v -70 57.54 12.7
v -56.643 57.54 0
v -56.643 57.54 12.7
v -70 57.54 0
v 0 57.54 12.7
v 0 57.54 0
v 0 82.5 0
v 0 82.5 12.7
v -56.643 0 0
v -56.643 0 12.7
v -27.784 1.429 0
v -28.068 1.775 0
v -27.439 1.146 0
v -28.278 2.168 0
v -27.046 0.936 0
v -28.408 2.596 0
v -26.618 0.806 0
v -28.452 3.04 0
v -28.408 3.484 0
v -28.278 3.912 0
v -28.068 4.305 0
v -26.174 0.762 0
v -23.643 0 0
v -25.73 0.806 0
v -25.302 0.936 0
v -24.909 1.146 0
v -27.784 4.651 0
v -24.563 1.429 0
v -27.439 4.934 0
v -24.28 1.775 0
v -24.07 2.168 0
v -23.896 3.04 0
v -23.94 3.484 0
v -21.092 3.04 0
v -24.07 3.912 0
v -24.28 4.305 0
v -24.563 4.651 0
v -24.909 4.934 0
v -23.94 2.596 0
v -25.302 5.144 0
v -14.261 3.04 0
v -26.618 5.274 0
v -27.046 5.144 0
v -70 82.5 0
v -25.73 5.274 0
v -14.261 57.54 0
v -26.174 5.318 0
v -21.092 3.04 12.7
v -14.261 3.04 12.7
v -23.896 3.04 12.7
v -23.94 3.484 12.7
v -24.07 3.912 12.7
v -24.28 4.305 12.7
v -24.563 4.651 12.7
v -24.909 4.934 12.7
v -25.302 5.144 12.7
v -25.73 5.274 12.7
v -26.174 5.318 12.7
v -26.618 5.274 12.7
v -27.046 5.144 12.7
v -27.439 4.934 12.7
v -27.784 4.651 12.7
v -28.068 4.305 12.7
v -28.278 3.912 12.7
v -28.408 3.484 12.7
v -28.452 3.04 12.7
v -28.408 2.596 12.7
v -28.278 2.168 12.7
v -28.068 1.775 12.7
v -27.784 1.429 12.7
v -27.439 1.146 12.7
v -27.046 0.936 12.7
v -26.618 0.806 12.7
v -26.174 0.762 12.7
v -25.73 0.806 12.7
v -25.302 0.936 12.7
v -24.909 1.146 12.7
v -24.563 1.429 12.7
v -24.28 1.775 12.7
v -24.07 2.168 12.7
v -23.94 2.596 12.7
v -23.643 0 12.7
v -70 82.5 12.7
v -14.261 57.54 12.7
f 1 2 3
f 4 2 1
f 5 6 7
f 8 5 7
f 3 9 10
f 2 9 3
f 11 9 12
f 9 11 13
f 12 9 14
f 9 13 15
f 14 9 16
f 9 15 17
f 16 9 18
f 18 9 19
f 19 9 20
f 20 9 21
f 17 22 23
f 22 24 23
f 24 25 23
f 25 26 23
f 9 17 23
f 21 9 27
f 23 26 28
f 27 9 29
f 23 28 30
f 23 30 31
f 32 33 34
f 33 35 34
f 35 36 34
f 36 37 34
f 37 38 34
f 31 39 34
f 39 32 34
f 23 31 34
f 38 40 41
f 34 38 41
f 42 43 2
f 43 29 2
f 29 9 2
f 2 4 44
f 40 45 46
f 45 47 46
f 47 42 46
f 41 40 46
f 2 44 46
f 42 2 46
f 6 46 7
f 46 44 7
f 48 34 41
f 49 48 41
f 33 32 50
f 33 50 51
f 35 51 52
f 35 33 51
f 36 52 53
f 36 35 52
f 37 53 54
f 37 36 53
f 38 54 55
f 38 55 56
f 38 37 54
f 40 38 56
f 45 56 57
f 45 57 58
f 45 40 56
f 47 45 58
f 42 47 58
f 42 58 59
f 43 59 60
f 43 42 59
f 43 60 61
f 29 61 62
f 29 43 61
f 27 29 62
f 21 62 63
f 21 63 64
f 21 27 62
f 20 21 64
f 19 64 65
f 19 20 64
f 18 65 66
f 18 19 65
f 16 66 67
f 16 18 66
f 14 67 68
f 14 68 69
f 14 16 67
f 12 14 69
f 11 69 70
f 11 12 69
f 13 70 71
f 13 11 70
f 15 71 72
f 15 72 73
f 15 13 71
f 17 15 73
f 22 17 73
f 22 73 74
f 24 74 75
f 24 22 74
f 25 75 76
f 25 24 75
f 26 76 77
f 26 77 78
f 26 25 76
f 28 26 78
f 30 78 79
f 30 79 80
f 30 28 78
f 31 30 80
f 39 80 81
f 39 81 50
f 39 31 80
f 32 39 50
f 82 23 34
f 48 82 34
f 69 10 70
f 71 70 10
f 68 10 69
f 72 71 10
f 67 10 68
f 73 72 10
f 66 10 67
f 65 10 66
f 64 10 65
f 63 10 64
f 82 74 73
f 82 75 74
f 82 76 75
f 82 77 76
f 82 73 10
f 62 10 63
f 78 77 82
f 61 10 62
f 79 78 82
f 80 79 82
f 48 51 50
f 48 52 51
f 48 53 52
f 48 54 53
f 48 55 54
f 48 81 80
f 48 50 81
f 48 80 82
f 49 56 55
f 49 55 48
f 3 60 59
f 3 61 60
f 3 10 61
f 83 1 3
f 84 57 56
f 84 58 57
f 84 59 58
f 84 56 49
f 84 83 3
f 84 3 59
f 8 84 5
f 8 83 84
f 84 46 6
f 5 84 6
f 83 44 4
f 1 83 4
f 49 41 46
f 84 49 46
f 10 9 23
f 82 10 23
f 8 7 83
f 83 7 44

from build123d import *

# Parameters (mm, degrees)
BOSS_EXTRUDE1_DEPTH = 12.7
SKETCH1_9_W         = 14.260820695
SKETCH1_9_H         = 54.5
SKETCH1_9_R         = 2.277625676
CUT_EXTRUDE6_DEPTH  = 12.7


with BuildPart() as part:
    # Sketch1 → Boss-Extrude1 (new body)
    with BuildSketch(Plane.XY):
        Polygon((-70, 3.04), (-59.19389142, 3.04), (-56.643028541, 0), (-23.643028541, 0), (-21.092165662, 3.04), (0, 3.04), (0, 82.5), (-70, 82.5), align=None)
    extrude(amount=BOSS_EXTRUDE1_DEPTH)

    # Sketch1<9> → Cut-Extrude6 (cut)
    with BuildSketch(Plane.XY):
        Polygon((-70, 57.54), (-70, 3.04), (-59.19389142, 3.04), (-56.643028541, 0), (-56.643028541, 57.54), align=None)
        with Locations((-7.130410348, 30.29)):
            Rectangle(SKETCH1_9_W, SKETCH1_9_H)
        with Locations((-26.17389142, 3.04)):
            Circle(SKETCH1_9_R)
    extrude(amount=CUT_EXTRUDE6_DEPTH, mode=Mode.SUBTRACT)


solid = part.part
